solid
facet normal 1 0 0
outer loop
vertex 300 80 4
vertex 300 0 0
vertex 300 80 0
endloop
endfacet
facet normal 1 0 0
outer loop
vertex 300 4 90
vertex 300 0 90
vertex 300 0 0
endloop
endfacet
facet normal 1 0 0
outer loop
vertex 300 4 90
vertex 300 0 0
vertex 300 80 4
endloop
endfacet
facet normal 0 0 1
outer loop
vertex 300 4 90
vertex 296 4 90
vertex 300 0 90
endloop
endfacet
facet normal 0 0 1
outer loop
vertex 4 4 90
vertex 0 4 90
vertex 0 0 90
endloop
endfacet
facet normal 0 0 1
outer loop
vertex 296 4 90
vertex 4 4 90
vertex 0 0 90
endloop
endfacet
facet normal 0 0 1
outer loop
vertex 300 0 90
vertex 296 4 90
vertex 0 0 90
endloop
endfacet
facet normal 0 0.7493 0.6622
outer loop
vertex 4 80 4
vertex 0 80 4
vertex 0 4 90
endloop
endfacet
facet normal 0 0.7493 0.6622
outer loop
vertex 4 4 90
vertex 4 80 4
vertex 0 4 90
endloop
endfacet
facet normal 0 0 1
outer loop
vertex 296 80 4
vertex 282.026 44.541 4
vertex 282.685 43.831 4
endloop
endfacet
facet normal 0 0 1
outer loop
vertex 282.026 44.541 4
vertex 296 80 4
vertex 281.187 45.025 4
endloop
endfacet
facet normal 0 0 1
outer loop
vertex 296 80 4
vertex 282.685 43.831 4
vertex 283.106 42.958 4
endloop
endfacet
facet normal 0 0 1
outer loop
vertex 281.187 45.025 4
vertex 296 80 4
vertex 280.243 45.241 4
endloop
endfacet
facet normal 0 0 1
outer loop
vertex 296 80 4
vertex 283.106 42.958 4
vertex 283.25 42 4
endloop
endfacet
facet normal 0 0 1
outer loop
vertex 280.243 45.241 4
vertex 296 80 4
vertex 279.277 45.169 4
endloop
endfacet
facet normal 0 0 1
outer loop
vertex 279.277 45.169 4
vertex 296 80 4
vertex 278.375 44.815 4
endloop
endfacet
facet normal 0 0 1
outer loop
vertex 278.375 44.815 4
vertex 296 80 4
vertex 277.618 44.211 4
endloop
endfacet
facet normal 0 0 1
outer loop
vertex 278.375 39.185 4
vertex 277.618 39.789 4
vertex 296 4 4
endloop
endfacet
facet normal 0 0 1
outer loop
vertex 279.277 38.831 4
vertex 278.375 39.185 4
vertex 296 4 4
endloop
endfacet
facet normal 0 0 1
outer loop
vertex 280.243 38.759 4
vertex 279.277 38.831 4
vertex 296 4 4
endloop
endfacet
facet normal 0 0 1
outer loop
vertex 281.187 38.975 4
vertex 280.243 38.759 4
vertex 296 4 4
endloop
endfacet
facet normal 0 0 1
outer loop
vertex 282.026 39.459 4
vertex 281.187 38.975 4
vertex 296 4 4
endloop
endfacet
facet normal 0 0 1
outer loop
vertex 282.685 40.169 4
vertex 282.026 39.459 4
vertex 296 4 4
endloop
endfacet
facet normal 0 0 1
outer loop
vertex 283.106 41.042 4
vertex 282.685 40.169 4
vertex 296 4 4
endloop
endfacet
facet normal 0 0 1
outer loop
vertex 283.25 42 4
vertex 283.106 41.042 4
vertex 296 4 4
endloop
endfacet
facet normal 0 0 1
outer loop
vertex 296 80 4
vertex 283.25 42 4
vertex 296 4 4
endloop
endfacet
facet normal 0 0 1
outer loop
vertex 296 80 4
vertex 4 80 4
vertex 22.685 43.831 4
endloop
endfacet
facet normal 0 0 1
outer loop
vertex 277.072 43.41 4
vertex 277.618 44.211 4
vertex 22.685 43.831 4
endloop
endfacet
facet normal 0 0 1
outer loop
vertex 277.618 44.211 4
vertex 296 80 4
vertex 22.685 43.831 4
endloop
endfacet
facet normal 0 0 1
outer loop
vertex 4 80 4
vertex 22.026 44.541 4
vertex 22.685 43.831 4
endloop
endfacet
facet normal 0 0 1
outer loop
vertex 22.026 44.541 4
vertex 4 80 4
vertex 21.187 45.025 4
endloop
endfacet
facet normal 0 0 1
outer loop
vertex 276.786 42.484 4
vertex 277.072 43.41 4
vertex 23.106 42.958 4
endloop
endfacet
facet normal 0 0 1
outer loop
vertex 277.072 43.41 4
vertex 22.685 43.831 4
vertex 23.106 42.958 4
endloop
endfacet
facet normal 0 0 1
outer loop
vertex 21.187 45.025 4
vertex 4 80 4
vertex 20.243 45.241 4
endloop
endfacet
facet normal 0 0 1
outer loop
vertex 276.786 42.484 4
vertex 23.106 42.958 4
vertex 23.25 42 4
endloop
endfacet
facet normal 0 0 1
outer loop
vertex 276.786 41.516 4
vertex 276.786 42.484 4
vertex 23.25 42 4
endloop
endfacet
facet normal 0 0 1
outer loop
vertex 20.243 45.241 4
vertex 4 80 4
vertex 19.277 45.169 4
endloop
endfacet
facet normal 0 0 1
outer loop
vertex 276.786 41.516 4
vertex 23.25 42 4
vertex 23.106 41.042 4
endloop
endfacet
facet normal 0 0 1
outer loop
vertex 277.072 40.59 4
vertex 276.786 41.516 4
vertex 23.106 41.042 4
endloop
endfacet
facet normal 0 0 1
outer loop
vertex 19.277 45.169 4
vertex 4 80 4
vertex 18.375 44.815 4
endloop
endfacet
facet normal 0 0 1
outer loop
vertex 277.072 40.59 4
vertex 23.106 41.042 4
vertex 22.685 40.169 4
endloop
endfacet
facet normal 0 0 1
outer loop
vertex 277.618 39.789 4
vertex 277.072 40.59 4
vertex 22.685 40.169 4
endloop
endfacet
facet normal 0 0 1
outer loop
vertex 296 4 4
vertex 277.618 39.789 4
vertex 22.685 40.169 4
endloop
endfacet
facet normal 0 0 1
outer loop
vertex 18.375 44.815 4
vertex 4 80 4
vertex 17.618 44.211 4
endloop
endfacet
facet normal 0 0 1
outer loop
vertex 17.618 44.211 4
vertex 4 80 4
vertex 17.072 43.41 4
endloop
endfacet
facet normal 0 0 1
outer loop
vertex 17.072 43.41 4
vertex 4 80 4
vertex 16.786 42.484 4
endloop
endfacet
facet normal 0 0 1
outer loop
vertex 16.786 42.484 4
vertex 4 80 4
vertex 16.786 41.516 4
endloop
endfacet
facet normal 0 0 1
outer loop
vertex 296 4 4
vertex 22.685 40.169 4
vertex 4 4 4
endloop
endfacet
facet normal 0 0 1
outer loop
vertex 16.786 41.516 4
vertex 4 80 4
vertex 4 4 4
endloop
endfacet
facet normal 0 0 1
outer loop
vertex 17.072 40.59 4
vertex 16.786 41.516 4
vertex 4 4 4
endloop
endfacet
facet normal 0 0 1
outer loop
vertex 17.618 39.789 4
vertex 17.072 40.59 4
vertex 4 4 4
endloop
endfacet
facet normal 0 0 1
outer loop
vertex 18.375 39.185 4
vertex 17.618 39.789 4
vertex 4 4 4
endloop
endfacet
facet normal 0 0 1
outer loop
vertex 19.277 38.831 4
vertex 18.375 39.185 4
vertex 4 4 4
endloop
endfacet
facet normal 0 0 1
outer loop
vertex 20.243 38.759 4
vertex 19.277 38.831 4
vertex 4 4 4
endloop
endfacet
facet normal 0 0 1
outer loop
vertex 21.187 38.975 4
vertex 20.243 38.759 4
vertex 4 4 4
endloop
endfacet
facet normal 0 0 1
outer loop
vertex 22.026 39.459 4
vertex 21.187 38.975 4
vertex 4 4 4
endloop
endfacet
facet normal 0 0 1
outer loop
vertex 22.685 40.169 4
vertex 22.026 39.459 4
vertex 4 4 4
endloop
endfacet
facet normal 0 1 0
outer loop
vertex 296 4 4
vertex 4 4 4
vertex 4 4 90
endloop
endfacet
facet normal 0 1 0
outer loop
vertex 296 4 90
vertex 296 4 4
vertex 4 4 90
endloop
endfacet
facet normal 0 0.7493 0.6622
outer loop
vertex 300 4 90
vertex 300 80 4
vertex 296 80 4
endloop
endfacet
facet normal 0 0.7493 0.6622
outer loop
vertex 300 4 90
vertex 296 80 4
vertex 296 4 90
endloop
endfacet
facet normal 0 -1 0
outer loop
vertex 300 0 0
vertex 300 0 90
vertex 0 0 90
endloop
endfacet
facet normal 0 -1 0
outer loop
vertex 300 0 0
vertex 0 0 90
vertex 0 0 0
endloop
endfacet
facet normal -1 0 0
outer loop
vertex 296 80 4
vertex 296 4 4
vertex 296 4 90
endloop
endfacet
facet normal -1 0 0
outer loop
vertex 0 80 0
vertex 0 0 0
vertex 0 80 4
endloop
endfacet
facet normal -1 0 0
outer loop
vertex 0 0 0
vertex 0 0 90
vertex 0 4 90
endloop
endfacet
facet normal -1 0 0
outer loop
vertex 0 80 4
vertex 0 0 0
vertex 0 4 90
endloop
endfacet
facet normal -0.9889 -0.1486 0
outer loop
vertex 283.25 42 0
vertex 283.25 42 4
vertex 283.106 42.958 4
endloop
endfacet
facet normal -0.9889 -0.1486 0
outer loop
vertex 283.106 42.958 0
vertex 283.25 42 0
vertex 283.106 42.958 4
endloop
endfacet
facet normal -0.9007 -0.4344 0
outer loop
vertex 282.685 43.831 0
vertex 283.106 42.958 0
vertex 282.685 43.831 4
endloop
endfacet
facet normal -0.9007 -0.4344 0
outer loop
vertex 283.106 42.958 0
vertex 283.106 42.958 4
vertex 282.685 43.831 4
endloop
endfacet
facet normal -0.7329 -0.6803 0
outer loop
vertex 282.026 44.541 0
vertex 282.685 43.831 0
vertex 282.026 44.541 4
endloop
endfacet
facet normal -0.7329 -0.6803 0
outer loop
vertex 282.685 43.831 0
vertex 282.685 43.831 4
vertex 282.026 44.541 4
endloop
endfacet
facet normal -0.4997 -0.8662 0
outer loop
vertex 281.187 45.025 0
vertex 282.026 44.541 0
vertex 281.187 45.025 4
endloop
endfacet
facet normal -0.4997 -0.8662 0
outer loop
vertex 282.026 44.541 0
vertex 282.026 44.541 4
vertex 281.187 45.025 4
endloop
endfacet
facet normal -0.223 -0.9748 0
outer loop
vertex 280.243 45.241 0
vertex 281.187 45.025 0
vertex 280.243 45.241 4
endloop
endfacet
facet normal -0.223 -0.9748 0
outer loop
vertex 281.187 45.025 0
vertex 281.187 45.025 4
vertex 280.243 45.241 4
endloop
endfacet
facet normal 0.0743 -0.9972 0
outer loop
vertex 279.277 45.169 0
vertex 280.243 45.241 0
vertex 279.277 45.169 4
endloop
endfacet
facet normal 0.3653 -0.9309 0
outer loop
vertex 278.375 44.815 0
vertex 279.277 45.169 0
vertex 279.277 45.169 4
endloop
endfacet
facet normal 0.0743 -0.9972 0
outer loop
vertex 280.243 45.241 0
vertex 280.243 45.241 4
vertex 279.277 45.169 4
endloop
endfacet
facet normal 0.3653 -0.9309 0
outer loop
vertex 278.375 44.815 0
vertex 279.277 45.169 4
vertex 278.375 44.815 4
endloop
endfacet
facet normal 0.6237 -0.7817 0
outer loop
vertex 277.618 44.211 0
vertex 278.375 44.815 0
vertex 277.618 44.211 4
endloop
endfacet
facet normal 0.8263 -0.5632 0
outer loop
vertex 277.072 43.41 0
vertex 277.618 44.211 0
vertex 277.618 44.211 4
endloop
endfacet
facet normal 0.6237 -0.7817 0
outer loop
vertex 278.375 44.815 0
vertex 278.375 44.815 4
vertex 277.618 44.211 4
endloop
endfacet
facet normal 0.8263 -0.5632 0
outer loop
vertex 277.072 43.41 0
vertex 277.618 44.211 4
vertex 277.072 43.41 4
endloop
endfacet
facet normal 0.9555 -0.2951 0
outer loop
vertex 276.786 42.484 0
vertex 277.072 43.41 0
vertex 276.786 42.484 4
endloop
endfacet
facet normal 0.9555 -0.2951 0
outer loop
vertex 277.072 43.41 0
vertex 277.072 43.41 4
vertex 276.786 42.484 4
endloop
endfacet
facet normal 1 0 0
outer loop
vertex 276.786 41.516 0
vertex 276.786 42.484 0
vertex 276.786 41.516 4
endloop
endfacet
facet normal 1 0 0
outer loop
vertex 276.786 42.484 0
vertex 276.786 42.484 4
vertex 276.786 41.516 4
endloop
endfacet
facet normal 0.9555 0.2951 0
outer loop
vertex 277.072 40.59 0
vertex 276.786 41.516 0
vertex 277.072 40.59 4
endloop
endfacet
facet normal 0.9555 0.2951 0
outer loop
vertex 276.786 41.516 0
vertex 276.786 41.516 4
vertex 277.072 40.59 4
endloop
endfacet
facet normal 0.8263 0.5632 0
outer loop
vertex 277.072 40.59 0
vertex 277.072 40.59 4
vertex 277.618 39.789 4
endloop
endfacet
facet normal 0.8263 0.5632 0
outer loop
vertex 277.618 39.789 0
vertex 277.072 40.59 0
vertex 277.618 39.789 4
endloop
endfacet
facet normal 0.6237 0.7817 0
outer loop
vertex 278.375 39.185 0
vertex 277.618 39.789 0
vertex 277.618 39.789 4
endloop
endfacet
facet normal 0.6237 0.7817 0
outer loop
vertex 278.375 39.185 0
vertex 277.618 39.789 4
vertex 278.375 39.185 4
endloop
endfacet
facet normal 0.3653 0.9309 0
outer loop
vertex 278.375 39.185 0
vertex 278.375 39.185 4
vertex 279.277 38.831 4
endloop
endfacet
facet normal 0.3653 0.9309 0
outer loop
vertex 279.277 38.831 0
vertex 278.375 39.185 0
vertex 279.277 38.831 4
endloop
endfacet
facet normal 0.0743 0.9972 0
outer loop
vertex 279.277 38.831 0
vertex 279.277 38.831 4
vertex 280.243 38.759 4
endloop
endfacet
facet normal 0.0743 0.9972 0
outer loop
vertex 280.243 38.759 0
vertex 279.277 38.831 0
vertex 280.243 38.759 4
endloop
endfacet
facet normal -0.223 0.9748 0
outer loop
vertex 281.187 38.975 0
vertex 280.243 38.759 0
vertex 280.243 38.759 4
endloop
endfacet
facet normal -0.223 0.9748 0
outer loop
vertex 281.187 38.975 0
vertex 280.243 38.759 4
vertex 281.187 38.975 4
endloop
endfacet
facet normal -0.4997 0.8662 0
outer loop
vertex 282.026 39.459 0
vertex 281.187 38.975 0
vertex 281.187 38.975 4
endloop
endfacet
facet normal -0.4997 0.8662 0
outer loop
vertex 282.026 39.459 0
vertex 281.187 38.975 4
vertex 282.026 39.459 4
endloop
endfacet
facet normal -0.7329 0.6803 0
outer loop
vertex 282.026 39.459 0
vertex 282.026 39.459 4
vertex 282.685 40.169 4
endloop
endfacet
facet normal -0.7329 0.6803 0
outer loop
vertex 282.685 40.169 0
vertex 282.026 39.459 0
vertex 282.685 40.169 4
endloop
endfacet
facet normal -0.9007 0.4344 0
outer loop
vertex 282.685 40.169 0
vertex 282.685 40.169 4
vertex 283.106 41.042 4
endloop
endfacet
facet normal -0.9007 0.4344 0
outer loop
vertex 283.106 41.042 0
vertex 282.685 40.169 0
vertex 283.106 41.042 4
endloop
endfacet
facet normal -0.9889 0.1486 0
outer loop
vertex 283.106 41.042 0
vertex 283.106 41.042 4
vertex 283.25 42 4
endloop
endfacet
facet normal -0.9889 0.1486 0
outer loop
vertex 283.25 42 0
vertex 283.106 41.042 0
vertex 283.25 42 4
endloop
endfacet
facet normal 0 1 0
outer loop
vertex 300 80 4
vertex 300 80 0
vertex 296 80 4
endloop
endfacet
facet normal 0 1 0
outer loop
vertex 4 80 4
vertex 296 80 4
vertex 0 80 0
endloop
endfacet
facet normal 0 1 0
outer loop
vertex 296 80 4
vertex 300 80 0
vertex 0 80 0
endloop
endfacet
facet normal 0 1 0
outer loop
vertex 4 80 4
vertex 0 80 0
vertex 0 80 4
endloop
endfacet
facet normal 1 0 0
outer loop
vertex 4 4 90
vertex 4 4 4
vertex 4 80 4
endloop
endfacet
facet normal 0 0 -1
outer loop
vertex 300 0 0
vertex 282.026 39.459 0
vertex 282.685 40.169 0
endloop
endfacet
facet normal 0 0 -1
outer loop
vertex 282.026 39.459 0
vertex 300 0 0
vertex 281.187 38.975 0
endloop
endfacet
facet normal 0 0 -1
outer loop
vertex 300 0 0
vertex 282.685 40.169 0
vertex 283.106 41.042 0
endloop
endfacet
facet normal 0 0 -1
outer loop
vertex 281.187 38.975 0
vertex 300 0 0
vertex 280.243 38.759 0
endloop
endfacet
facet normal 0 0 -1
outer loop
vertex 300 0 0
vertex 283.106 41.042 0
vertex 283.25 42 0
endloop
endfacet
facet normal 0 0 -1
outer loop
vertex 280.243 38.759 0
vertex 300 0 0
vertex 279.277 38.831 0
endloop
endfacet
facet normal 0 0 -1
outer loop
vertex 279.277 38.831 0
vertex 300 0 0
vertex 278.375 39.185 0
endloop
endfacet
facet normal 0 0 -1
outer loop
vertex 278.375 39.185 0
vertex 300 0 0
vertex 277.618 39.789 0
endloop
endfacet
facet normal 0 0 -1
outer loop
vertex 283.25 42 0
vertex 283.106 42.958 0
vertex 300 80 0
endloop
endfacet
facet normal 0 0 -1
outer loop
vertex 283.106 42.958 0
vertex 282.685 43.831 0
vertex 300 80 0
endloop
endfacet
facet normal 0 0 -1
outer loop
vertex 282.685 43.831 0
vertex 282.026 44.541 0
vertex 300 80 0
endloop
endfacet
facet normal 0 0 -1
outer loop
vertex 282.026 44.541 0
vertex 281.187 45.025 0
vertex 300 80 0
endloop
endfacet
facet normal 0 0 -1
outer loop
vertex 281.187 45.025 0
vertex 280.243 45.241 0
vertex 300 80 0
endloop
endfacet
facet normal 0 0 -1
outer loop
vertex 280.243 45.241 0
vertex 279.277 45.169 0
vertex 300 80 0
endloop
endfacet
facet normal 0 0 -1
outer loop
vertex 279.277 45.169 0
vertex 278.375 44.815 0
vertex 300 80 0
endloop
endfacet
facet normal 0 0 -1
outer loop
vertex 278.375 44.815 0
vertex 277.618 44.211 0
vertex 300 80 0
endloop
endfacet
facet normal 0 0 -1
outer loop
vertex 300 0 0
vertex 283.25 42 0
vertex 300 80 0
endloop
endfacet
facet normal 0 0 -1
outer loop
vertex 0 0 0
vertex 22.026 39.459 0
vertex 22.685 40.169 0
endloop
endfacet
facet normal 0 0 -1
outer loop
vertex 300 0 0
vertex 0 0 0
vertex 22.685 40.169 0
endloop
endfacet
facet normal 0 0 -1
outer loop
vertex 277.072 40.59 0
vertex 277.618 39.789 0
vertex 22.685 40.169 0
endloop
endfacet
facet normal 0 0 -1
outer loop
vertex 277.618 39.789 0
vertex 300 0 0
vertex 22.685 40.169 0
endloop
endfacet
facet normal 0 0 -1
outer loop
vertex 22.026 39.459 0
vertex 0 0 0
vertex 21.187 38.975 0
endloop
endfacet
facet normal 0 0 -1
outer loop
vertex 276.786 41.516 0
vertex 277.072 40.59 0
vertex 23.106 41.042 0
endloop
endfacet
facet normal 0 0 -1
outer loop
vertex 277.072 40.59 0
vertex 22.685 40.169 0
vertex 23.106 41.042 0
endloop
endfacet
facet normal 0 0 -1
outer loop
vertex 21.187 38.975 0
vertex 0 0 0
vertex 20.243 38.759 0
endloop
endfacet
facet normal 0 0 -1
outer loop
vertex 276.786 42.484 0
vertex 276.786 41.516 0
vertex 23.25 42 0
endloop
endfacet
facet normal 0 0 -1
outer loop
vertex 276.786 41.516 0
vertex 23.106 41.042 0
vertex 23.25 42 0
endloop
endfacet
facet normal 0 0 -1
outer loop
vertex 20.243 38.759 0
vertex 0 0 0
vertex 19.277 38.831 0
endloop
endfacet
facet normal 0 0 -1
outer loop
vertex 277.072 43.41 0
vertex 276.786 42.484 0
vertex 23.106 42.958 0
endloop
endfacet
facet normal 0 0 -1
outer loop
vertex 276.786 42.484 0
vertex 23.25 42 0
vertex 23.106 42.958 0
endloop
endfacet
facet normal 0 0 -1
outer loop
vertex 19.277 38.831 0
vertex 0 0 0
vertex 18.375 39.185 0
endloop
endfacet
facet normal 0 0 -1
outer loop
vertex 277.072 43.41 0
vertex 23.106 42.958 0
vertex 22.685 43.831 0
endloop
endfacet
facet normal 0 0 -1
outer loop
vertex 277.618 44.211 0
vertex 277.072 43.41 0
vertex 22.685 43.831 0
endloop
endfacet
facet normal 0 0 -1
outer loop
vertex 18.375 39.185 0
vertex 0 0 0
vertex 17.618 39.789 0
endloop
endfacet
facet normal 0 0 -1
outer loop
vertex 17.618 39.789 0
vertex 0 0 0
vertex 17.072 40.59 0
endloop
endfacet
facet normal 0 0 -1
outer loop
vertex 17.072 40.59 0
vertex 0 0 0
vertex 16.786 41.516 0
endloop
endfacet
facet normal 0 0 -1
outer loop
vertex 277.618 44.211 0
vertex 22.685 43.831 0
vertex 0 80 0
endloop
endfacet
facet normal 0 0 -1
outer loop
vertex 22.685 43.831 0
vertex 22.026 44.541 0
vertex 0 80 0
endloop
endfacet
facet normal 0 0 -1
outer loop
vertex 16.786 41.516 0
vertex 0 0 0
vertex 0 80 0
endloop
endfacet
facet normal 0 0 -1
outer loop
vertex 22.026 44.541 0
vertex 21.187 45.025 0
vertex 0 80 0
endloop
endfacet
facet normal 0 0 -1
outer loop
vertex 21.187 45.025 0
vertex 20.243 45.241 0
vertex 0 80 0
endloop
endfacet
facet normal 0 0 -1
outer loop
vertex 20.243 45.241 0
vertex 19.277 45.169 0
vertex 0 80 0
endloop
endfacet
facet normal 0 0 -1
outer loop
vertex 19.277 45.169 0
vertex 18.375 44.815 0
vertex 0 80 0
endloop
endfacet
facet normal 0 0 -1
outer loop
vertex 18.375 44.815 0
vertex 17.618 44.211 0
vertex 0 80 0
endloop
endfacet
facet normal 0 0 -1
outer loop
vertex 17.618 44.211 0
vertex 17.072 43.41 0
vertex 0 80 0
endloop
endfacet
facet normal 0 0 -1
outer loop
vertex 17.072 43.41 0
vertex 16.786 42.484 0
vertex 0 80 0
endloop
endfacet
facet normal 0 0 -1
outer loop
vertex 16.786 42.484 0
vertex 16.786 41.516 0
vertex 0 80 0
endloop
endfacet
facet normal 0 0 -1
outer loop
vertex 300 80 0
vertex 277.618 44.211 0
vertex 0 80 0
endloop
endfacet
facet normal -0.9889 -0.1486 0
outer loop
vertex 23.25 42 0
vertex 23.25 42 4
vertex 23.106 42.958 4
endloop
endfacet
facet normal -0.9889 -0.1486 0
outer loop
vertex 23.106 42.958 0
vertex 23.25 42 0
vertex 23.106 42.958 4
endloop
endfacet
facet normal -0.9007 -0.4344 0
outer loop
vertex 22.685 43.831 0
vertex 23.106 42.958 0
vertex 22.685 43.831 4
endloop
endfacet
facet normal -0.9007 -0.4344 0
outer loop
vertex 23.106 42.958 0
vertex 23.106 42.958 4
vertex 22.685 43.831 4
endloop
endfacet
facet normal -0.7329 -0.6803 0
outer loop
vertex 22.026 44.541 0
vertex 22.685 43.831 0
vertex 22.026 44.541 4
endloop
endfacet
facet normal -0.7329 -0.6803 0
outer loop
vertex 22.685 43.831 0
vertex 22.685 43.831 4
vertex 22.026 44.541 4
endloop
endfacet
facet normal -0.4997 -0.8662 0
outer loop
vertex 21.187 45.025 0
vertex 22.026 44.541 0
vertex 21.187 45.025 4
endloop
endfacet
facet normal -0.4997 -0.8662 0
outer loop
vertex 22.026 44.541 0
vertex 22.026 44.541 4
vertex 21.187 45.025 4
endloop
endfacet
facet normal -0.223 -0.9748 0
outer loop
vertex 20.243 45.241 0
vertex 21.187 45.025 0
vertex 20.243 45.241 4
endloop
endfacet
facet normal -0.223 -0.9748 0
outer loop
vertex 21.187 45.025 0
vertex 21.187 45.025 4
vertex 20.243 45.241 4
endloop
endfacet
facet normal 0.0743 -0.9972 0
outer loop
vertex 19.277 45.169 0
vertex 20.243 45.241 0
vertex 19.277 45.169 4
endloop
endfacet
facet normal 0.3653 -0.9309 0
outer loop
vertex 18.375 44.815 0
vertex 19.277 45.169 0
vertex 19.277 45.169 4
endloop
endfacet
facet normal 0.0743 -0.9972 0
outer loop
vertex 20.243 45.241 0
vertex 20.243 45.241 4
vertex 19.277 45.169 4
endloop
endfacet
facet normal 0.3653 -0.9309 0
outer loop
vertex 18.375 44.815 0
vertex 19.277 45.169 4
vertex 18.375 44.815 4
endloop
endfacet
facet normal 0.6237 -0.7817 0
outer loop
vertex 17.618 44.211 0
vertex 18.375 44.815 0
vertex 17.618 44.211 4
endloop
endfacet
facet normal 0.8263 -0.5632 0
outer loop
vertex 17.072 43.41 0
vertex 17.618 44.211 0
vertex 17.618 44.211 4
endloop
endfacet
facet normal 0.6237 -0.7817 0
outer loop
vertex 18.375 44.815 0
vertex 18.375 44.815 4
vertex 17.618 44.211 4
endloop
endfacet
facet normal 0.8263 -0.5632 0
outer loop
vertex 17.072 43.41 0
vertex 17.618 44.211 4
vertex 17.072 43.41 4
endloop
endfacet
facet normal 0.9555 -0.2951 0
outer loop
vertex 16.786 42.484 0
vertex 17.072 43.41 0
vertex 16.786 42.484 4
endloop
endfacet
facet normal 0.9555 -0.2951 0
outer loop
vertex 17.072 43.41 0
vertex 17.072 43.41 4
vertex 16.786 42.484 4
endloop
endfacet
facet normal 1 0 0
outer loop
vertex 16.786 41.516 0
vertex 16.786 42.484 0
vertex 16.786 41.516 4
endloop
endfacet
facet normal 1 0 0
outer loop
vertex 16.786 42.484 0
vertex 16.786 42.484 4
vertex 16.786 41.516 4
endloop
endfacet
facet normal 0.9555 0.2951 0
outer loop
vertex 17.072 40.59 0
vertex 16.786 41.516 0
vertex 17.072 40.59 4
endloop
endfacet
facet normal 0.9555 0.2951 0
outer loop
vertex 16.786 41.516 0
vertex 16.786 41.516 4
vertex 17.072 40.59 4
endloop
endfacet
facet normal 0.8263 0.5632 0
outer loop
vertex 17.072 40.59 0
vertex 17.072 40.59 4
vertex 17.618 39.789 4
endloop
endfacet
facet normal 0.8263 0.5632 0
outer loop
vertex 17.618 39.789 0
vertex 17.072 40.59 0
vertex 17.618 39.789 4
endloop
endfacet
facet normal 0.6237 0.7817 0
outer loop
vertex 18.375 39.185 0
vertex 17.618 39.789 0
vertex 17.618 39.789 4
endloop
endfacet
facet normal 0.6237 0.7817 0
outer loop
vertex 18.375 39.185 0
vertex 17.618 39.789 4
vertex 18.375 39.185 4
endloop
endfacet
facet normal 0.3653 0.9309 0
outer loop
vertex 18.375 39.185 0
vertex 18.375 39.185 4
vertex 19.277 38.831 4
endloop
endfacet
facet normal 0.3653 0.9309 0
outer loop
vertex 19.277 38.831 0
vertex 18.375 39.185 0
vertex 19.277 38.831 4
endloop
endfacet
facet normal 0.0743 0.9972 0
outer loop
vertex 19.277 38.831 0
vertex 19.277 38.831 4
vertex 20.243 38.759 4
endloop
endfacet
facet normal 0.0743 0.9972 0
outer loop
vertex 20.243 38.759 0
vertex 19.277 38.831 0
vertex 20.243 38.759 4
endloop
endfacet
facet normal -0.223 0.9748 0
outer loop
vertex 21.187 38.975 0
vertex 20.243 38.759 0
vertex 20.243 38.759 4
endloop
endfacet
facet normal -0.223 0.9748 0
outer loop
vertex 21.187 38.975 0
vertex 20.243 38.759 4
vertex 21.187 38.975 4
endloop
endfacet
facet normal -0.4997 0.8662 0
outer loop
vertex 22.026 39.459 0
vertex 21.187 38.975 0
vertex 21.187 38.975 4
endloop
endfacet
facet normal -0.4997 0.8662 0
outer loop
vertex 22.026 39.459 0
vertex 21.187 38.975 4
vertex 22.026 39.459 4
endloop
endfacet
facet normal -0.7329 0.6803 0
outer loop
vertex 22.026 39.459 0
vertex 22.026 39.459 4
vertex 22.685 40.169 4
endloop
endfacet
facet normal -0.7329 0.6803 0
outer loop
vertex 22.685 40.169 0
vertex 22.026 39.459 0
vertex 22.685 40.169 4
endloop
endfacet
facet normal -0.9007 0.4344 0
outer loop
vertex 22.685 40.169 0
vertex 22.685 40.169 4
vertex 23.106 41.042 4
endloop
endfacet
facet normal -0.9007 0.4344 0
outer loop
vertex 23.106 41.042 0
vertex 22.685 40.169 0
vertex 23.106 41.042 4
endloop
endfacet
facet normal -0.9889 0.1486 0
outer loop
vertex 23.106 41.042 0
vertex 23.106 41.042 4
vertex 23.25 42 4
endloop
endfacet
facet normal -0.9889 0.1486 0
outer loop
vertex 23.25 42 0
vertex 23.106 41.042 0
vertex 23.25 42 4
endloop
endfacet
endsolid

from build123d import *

# Parameters (mm, degrees)
F1_DEPTH = 300
F2_R     = 3.25
F3_DEPTH = 25
F5_DEPTH = 4
F8_DEPTH = 4


with BuildPart() as f1:
    # F0 (on Right) → F1 (new body)
    with BuildSketch(Plane.YZ):
        Polygon((0, 90), (0, 0), (80, 0), (80, 4), (4, 4), (4, 90), align=None)
    extrude(amount=F1_DEPTH)

    # F2 (on face) → F3 (cut)
    with BuildSketch(Plane.XY.offset(4)):
        with Locations((20, 42)):
            Circle(F2_R)
        with Locations((280, 42)):
            Circle(F2_R)
    extrude(amount=-F3_DEPTH, mode=Mode.SUBTRACT)

    # F4 (on Right) → F5 (join)
    with BuildSketch(Plane.YZ):
        Polygon((4, 4), (80, 4), (4, 90), align=None)
    extrude(amount=F5_DEPTH)

    # F7 (on offset) → F8 (join)
    with BuildSketch(Plane.YZ.offset(300)):
        Polygon((80, 4), (4, 90), (4, 4), align=None)
    extrude(amount=-F8_DEPTH)


solid = f1.part
